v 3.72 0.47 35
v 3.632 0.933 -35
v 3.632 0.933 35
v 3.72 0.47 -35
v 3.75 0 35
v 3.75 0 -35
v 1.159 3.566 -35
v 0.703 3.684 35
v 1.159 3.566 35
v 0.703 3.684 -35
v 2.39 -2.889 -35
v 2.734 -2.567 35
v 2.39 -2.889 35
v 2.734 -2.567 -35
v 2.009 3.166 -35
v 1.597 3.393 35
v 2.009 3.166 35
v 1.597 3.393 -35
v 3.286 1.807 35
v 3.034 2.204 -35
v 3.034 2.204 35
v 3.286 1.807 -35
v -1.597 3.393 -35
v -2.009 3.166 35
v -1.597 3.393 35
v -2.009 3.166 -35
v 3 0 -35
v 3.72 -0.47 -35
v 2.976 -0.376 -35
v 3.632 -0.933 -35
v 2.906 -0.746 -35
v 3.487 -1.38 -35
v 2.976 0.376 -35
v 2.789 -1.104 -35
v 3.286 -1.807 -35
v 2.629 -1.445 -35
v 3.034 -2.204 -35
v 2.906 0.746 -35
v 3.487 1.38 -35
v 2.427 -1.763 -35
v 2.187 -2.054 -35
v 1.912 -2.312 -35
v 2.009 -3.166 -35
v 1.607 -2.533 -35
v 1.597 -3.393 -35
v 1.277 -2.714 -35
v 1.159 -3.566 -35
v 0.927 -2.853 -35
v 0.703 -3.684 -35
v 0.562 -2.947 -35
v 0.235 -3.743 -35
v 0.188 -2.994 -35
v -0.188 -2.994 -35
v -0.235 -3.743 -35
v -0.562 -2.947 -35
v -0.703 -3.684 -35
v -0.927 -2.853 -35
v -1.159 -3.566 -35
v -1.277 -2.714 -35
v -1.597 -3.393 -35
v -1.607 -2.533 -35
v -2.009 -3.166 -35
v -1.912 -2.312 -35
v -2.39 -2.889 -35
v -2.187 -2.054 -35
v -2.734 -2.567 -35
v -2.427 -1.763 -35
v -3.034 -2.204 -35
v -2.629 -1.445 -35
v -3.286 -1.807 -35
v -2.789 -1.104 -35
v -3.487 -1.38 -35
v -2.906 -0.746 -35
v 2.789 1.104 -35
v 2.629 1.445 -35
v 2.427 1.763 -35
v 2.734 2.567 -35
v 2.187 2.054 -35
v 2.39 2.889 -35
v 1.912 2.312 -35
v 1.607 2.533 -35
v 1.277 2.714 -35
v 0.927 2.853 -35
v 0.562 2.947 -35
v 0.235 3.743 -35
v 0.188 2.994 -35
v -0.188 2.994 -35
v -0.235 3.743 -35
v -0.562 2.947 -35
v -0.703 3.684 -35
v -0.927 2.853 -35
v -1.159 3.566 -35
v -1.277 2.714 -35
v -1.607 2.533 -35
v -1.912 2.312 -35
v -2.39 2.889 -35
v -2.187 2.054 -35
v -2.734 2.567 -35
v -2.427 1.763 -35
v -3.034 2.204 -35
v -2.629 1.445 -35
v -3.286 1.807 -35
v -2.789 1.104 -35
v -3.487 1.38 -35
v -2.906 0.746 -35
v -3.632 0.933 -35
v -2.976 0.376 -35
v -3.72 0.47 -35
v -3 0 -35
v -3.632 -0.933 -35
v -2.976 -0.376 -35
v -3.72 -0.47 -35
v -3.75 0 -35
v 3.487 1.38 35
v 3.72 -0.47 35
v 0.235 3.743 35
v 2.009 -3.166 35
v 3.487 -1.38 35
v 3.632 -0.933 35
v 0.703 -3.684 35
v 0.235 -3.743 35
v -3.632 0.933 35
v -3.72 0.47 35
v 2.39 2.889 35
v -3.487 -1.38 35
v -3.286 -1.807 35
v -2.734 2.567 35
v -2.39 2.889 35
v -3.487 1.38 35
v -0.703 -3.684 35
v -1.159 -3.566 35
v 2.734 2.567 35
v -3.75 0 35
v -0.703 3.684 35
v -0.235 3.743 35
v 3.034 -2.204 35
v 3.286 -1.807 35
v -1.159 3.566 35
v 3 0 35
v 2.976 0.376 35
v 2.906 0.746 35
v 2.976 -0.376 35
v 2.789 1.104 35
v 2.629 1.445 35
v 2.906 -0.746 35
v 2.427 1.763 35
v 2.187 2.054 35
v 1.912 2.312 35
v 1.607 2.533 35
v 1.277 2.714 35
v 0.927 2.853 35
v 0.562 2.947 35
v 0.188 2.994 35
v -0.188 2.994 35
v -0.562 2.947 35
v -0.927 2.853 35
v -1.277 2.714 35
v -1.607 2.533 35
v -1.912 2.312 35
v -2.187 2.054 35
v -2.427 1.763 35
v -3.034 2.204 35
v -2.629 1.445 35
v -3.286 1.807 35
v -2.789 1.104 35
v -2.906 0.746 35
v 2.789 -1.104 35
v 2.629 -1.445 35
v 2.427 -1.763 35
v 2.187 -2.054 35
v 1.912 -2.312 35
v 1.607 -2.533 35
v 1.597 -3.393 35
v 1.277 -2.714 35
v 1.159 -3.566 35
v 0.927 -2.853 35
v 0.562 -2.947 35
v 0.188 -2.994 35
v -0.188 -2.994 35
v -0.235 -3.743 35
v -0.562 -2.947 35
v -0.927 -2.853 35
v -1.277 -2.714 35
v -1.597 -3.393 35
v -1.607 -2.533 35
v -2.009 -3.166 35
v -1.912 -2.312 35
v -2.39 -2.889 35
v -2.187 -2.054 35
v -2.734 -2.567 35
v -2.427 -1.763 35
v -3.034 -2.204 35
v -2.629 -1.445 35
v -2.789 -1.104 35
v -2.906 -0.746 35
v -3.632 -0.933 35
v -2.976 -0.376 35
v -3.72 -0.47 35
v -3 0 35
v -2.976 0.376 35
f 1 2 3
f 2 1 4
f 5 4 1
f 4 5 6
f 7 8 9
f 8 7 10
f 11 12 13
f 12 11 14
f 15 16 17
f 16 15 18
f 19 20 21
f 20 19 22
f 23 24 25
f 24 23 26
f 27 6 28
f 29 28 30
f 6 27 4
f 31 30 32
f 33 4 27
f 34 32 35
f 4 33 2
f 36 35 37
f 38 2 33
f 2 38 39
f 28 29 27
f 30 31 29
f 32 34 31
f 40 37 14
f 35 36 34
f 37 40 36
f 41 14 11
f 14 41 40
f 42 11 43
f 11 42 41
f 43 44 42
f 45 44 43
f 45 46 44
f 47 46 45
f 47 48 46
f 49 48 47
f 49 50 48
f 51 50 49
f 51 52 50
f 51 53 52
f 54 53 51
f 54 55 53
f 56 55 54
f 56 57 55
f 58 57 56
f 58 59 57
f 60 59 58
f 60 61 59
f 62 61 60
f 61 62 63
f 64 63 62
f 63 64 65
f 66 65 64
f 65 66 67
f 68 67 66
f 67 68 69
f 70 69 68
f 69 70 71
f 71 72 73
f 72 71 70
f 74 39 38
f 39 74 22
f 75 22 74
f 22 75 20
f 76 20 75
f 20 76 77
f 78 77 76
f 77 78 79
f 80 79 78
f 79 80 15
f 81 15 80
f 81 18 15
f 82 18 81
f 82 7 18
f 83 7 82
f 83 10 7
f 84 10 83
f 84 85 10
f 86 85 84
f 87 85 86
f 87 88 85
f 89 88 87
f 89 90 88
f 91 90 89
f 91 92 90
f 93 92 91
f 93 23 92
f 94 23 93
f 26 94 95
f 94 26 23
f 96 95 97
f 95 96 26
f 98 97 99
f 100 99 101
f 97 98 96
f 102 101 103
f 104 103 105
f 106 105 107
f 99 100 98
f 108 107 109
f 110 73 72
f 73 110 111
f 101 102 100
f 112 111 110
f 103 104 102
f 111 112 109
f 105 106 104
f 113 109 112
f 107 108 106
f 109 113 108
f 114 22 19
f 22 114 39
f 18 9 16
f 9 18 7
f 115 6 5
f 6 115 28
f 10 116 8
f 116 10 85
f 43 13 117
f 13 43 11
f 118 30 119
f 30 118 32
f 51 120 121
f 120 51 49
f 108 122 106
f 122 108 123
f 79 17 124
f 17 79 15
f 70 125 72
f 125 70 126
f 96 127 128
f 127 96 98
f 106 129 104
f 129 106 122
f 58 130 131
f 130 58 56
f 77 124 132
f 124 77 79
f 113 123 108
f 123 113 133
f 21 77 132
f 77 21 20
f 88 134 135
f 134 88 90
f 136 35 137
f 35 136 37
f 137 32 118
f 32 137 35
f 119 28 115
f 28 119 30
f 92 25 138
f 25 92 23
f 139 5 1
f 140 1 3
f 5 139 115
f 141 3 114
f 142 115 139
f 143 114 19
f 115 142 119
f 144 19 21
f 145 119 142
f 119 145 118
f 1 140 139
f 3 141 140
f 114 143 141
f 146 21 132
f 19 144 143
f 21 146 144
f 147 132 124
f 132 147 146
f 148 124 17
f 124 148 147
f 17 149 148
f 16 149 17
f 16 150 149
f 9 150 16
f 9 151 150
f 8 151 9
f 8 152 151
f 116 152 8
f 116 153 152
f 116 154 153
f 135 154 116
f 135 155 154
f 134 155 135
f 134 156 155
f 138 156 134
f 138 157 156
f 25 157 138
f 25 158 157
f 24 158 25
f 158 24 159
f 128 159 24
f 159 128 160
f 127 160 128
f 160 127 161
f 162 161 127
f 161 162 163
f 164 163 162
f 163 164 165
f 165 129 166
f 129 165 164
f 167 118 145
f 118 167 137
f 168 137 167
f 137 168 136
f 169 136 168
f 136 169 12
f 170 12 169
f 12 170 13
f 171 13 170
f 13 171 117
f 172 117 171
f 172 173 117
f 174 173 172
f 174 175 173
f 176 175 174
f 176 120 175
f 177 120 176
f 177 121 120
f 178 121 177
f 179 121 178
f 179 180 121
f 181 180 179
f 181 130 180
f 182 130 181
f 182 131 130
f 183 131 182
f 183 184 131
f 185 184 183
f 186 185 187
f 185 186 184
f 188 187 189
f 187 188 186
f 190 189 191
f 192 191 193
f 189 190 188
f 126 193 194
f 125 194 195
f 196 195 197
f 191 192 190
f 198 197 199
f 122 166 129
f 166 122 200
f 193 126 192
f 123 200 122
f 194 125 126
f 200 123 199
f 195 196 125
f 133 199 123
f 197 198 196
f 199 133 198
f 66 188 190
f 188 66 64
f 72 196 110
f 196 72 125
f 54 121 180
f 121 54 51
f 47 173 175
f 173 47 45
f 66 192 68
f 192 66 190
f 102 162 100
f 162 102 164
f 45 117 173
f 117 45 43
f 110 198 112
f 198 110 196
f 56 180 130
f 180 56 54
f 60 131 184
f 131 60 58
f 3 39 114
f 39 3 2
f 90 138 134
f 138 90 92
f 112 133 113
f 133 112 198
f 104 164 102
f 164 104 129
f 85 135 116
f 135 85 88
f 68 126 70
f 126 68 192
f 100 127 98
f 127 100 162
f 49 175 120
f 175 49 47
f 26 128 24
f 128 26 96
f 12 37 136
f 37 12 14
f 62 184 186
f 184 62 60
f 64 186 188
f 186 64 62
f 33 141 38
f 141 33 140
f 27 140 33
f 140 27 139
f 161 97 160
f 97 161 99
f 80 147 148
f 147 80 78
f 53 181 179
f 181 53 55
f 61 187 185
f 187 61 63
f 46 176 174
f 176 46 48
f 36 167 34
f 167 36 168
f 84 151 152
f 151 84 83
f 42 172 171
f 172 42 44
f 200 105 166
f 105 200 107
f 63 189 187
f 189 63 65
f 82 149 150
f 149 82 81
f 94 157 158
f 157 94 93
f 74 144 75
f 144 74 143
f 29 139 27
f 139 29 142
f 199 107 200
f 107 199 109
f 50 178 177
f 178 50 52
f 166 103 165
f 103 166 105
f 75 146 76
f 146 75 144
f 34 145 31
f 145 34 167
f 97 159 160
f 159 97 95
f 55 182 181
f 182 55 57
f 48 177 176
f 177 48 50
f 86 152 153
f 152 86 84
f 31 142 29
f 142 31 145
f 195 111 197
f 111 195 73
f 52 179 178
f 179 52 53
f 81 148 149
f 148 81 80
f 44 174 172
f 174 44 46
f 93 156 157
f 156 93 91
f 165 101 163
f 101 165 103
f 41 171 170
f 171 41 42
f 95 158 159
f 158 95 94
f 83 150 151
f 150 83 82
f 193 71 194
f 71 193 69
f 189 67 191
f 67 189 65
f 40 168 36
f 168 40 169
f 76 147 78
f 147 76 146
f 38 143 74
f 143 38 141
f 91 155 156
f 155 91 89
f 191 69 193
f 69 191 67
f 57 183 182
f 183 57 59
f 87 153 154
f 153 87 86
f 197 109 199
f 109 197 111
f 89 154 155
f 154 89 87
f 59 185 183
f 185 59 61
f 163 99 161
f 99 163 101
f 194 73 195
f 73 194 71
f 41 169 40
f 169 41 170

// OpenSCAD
$fn = 50;


difference() {
	union() {
		translate(v = [0, 0, -35.0000000000]) {
			cylinder(h = 70, r = 3.7500000000);
		}
	}
	union() {
		translate(v = [0, 0, -100.0000000000]) {
			cylinder(h = 200, r = 3.0000000000);
		}
	}
}
